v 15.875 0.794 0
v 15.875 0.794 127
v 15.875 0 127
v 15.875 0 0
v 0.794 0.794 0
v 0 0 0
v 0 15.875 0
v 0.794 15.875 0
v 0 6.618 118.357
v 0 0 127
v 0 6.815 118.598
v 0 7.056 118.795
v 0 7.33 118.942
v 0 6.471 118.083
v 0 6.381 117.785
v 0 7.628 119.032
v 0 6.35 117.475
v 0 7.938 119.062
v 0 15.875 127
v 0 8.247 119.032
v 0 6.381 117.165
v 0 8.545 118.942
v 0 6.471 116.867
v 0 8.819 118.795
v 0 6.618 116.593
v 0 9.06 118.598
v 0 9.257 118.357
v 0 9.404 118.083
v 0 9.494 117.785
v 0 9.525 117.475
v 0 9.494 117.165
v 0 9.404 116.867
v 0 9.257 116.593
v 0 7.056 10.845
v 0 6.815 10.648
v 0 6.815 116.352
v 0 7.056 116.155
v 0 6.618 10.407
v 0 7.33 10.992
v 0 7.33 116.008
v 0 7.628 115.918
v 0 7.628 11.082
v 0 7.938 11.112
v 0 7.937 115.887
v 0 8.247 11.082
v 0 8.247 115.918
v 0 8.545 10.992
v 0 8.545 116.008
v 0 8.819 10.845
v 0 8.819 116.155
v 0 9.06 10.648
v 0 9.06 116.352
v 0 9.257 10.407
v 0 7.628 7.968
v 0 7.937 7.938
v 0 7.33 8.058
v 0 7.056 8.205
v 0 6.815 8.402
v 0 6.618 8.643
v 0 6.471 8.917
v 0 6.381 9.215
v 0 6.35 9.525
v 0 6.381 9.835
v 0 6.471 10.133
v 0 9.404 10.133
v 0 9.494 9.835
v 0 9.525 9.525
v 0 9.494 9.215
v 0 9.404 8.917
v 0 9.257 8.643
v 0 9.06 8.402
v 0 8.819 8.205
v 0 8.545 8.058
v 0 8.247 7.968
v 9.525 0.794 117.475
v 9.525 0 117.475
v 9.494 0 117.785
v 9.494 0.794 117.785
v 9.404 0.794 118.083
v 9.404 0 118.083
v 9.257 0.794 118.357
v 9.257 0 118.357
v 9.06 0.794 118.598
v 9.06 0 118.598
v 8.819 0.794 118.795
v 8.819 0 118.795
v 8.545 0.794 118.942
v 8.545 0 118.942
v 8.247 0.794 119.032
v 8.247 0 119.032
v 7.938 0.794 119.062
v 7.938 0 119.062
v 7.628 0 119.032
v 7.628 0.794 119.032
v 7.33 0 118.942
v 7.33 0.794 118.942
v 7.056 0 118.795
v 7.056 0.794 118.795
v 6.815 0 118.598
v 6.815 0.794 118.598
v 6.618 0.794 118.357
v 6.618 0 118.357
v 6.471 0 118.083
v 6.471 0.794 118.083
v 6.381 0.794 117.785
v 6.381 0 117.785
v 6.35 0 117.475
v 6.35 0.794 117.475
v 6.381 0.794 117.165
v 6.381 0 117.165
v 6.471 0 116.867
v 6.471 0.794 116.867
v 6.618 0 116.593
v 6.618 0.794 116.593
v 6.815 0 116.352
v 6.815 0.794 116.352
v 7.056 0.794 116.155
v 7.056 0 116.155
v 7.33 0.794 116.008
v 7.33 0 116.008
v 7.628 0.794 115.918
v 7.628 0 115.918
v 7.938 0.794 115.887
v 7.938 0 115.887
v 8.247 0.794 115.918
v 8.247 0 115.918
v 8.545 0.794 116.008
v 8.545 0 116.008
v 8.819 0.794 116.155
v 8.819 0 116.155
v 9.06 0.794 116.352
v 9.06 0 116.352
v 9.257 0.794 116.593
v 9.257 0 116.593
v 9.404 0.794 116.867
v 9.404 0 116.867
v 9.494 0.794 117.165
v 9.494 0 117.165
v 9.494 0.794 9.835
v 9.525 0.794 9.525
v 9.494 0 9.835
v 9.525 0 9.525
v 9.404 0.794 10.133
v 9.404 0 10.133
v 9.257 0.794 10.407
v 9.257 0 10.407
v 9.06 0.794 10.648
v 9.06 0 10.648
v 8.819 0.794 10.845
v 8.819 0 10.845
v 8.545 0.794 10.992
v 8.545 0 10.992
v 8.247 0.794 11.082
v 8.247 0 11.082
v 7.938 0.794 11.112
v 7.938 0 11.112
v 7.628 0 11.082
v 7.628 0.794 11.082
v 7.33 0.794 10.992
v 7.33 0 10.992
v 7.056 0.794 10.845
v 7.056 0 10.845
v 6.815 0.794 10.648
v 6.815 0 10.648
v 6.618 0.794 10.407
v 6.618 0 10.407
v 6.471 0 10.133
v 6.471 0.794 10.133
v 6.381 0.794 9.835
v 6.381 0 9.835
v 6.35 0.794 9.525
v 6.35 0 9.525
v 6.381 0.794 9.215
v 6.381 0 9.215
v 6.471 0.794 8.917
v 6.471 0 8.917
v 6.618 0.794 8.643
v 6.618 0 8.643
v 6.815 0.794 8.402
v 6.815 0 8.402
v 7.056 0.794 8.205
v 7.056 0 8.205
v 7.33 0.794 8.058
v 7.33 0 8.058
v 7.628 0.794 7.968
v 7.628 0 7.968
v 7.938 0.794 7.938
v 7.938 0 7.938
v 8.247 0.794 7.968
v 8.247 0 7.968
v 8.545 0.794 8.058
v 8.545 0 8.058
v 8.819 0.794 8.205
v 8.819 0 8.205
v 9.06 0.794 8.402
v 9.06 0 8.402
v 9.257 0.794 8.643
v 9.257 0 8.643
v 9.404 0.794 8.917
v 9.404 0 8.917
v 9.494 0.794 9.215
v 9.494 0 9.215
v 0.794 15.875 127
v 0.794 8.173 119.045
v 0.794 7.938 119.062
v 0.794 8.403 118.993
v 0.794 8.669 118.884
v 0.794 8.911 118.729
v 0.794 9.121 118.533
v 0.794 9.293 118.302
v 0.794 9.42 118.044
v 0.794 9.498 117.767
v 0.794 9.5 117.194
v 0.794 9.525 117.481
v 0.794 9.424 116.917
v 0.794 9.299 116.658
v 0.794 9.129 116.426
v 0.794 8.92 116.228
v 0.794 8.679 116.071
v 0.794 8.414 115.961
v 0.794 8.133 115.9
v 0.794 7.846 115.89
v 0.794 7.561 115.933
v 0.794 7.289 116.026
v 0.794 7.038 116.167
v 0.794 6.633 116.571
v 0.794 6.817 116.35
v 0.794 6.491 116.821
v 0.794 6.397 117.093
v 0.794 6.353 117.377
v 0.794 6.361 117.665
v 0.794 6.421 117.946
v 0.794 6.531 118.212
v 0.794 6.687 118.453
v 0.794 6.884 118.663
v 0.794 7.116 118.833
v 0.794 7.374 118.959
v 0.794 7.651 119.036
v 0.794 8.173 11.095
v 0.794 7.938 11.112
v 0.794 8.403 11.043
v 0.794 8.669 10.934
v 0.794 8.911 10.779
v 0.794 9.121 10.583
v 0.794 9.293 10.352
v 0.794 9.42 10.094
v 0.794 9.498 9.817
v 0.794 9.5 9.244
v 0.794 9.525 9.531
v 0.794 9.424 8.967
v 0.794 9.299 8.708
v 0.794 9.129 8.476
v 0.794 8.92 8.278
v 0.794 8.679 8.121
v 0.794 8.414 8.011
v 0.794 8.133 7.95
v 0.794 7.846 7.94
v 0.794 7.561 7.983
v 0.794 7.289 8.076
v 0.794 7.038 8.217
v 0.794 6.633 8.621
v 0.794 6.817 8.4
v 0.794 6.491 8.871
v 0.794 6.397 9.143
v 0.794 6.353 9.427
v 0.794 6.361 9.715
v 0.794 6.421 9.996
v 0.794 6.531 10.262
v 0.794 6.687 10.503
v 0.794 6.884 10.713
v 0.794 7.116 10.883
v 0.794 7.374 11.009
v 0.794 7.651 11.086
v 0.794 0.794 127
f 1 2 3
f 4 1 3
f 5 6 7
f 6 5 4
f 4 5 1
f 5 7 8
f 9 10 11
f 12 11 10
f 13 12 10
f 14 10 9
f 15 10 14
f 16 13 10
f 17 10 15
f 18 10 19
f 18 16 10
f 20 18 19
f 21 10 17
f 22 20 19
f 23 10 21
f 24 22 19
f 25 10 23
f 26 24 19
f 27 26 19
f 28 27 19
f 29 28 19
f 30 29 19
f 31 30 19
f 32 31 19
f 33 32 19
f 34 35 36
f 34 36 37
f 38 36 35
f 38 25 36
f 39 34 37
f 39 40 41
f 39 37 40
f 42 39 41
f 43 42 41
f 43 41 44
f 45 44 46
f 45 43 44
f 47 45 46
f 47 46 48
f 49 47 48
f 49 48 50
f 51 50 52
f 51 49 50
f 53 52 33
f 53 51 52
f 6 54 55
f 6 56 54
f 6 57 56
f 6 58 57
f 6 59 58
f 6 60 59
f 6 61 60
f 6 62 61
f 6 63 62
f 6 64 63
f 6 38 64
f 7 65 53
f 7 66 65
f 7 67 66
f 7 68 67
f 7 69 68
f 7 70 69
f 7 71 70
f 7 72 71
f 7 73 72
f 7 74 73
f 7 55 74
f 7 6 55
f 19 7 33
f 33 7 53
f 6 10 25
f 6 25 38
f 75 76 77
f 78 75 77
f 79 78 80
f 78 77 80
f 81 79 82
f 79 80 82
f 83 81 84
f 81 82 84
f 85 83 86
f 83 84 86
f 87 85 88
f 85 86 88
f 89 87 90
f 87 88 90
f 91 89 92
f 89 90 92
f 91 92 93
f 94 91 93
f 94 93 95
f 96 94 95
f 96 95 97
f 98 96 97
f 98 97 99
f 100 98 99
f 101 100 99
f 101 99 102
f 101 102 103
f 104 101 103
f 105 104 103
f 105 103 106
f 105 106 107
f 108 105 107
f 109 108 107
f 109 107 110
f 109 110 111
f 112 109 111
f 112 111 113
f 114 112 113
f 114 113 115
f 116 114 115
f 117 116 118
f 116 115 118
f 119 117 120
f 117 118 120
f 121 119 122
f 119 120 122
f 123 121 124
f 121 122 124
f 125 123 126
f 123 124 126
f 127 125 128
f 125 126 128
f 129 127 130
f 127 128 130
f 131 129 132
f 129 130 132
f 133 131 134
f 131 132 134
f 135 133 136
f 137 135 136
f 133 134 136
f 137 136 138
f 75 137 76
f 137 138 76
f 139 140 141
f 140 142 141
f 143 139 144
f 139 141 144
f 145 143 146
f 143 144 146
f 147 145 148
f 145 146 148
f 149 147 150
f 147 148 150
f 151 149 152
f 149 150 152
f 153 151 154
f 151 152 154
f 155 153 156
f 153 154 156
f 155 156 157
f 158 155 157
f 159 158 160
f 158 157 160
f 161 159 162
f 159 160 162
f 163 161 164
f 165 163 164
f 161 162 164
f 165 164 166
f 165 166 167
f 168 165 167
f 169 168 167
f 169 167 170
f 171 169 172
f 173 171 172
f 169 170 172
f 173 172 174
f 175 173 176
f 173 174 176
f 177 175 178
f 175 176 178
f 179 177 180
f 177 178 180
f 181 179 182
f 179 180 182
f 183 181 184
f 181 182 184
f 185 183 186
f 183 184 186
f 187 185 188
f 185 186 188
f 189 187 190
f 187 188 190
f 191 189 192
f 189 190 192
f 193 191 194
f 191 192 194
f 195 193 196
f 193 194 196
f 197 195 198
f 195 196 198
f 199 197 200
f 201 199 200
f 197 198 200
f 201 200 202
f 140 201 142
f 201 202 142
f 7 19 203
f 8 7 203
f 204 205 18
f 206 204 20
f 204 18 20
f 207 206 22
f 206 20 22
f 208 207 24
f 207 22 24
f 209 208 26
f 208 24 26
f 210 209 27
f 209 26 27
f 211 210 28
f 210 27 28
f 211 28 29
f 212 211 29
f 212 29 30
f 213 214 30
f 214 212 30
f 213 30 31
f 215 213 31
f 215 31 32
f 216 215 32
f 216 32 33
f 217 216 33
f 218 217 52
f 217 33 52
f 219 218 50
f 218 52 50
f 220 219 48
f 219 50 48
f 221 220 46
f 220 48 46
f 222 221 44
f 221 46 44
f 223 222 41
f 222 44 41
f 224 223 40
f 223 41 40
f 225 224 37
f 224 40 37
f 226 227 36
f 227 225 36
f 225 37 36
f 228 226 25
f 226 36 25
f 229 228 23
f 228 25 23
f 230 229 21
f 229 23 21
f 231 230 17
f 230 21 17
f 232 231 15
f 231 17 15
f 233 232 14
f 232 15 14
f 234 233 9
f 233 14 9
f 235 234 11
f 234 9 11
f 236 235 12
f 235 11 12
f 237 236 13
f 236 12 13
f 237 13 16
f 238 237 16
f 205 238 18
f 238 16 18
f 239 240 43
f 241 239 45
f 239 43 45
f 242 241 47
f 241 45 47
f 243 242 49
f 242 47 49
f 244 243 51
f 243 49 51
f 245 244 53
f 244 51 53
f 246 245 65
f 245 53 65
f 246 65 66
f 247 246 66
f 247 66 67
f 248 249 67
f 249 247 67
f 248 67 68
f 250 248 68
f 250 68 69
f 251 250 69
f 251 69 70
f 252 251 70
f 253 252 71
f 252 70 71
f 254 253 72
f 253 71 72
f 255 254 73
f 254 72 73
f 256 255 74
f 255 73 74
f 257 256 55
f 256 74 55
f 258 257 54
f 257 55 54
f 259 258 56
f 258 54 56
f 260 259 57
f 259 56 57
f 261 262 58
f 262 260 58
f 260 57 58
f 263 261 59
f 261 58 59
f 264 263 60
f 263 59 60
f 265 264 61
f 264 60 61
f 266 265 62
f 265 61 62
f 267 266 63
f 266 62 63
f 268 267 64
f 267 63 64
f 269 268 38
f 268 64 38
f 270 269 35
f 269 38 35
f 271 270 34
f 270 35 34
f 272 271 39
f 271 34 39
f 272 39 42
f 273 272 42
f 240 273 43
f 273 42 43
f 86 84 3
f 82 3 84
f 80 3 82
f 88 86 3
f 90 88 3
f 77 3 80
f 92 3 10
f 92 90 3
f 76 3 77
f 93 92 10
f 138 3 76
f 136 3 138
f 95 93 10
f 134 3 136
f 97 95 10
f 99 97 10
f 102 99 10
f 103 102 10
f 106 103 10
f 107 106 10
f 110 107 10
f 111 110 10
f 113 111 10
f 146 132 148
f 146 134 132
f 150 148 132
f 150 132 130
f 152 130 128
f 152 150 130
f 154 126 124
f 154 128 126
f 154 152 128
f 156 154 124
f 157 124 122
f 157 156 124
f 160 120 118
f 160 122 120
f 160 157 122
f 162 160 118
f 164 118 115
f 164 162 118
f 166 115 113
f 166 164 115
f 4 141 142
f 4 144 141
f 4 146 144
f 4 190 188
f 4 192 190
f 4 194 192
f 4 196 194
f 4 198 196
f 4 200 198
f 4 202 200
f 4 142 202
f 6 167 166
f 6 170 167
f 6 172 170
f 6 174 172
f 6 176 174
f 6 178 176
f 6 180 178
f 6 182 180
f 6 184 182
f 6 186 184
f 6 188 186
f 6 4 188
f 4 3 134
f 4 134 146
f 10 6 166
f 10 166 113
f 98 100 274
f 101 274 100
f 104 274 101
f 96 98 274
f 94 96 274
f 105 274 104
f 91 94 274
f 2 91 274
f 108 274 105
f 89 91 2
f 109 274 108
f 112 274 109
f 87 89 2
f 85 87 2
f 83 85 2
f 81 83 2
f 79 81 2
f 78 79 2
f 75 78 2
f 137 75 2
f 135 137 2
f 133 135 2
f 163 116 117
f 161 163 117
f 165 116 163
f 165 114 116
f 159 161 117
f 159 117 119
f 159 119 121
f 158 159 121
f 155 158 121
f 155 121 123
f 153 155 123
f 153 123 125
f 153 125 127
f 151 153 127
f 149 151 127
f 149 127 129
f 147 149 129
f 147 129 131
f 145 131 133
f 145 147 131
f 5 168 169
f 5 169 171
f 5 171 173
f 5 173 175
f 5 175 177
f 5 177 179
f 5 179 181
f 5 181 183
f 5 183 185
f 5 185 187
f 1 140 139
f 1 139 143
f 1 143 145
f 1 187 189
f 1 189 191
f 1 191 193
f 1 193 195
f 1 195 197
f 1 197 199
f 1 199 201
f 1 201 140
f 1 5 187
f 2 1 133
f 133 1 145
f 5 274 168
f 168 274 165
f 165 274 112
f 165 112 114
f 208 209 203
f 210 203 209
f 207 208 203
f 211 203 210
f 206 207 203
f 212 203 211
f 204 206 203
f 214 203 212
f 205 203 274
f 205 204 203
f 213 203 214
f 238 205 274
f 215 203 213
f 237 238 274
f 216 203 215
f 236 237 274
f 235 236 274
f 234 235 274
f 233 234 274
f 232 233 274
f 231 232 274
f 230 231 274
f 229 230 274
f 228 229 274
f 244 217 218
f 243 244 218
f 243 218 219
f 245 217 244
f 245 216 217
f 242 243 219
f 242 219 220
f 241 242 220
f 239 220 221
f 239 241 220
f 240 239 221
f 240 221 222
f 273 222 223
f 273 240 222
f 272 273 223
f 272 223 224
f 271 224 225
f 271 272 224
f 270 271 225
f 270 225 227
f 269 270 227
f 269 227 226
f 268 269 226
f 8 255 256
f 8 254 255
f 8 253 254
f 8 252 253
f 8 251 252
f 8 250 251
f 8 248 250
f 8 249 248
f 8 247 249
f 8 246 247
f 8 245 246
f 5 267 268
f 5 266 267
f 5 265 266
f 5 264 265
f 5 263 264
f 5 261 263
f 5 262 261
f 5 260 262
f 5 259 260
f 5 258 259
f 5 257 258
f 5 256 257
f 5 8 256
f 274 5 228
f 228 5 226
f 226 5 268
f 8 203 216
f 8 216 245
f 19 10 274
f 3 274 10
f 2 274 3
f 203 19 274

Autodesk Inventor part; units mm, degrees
ref_plane "YZ Plane" through (0, 0, 0) normal (1, 0, 0) x (0, 1, 0)
ref_plane "XZ Plane" through (0, 0, 0) normal (0, 1, 0) x (-1, 0, 0)
ref_plane "XY Plane" through (0, 0, 0) normal (0, 0, 1) x (1, 0, 0)
sketch "Sketch1" plane through (0, 0, 0) normal (0, 0, 1) x (1, 0, 0)
  line L0 (0, 0) -> (0, 15.875)
  line L1 (0, 15.875) -> (0.7937, 15.875)
  line L2 (0.7937, 15.875) -> (0.7938, 0.7937)
  line L3 (0.7938, 0.7937) -> (15.875, 0.7937)
  line L4 (15.875, 0.7937) -> (15.875, 0)
  line L5 (15.875, 0) -> (0, 0)
  dimension "d0" = 15.875
  dimension "d1" = 0.7937
extrude "Extrusion1" add sketch "Sketch1" along normal blind 127
sketch "Sketch2" plane through (0, 0, 0) normal (0, -1, 0) x (1, 0, 0)
  line L0 (15.875, 0) -> (0, 0) projected
  line L1 (0, 127) -> (15.875, 127) projected
  line L2 (7.9375, 127) -> (7.9375, 0) construction
  circle A0 centre (7.9375, 117.475) radius 1.5875
  circle A1 centre (7.9375, 9.525) radius 1.5875
  dimension "d4" = 3.175
  dimension "d5" = 3.175
  dimension "d6" = 9.525
  dimension "d7" = 9.525
extrude "Extrusion2" cut sketch "Sketch2" against normal through all
sketch "Sketch3" plane through (0, 0, 0) normal (-1, 0, 0) x (0, 0, 1)
  line L0 (0, 0) -> (0, 15.875) projected
  line L1 (127, 15.875) -> (127, 0) projected
  line L2 (0, 7.9375) -> (127, 7.9375) construction
  circle A0 centre (9.525, 7.9375) radius 1.5875
  circle A1 centre (117.475, 7.9375) radius 1.5875
  dimension "d10" = 3.175
  dimension "d11" = 3.175
  dimension "d12" = 9.525
  dimension "d13" = 9.525
extrude "Extrusion3" cut sketch "Sketch3" against normal through all
properties part number "Shooter Wheel Shields Connector Bar" material "Aluminum 6061"
